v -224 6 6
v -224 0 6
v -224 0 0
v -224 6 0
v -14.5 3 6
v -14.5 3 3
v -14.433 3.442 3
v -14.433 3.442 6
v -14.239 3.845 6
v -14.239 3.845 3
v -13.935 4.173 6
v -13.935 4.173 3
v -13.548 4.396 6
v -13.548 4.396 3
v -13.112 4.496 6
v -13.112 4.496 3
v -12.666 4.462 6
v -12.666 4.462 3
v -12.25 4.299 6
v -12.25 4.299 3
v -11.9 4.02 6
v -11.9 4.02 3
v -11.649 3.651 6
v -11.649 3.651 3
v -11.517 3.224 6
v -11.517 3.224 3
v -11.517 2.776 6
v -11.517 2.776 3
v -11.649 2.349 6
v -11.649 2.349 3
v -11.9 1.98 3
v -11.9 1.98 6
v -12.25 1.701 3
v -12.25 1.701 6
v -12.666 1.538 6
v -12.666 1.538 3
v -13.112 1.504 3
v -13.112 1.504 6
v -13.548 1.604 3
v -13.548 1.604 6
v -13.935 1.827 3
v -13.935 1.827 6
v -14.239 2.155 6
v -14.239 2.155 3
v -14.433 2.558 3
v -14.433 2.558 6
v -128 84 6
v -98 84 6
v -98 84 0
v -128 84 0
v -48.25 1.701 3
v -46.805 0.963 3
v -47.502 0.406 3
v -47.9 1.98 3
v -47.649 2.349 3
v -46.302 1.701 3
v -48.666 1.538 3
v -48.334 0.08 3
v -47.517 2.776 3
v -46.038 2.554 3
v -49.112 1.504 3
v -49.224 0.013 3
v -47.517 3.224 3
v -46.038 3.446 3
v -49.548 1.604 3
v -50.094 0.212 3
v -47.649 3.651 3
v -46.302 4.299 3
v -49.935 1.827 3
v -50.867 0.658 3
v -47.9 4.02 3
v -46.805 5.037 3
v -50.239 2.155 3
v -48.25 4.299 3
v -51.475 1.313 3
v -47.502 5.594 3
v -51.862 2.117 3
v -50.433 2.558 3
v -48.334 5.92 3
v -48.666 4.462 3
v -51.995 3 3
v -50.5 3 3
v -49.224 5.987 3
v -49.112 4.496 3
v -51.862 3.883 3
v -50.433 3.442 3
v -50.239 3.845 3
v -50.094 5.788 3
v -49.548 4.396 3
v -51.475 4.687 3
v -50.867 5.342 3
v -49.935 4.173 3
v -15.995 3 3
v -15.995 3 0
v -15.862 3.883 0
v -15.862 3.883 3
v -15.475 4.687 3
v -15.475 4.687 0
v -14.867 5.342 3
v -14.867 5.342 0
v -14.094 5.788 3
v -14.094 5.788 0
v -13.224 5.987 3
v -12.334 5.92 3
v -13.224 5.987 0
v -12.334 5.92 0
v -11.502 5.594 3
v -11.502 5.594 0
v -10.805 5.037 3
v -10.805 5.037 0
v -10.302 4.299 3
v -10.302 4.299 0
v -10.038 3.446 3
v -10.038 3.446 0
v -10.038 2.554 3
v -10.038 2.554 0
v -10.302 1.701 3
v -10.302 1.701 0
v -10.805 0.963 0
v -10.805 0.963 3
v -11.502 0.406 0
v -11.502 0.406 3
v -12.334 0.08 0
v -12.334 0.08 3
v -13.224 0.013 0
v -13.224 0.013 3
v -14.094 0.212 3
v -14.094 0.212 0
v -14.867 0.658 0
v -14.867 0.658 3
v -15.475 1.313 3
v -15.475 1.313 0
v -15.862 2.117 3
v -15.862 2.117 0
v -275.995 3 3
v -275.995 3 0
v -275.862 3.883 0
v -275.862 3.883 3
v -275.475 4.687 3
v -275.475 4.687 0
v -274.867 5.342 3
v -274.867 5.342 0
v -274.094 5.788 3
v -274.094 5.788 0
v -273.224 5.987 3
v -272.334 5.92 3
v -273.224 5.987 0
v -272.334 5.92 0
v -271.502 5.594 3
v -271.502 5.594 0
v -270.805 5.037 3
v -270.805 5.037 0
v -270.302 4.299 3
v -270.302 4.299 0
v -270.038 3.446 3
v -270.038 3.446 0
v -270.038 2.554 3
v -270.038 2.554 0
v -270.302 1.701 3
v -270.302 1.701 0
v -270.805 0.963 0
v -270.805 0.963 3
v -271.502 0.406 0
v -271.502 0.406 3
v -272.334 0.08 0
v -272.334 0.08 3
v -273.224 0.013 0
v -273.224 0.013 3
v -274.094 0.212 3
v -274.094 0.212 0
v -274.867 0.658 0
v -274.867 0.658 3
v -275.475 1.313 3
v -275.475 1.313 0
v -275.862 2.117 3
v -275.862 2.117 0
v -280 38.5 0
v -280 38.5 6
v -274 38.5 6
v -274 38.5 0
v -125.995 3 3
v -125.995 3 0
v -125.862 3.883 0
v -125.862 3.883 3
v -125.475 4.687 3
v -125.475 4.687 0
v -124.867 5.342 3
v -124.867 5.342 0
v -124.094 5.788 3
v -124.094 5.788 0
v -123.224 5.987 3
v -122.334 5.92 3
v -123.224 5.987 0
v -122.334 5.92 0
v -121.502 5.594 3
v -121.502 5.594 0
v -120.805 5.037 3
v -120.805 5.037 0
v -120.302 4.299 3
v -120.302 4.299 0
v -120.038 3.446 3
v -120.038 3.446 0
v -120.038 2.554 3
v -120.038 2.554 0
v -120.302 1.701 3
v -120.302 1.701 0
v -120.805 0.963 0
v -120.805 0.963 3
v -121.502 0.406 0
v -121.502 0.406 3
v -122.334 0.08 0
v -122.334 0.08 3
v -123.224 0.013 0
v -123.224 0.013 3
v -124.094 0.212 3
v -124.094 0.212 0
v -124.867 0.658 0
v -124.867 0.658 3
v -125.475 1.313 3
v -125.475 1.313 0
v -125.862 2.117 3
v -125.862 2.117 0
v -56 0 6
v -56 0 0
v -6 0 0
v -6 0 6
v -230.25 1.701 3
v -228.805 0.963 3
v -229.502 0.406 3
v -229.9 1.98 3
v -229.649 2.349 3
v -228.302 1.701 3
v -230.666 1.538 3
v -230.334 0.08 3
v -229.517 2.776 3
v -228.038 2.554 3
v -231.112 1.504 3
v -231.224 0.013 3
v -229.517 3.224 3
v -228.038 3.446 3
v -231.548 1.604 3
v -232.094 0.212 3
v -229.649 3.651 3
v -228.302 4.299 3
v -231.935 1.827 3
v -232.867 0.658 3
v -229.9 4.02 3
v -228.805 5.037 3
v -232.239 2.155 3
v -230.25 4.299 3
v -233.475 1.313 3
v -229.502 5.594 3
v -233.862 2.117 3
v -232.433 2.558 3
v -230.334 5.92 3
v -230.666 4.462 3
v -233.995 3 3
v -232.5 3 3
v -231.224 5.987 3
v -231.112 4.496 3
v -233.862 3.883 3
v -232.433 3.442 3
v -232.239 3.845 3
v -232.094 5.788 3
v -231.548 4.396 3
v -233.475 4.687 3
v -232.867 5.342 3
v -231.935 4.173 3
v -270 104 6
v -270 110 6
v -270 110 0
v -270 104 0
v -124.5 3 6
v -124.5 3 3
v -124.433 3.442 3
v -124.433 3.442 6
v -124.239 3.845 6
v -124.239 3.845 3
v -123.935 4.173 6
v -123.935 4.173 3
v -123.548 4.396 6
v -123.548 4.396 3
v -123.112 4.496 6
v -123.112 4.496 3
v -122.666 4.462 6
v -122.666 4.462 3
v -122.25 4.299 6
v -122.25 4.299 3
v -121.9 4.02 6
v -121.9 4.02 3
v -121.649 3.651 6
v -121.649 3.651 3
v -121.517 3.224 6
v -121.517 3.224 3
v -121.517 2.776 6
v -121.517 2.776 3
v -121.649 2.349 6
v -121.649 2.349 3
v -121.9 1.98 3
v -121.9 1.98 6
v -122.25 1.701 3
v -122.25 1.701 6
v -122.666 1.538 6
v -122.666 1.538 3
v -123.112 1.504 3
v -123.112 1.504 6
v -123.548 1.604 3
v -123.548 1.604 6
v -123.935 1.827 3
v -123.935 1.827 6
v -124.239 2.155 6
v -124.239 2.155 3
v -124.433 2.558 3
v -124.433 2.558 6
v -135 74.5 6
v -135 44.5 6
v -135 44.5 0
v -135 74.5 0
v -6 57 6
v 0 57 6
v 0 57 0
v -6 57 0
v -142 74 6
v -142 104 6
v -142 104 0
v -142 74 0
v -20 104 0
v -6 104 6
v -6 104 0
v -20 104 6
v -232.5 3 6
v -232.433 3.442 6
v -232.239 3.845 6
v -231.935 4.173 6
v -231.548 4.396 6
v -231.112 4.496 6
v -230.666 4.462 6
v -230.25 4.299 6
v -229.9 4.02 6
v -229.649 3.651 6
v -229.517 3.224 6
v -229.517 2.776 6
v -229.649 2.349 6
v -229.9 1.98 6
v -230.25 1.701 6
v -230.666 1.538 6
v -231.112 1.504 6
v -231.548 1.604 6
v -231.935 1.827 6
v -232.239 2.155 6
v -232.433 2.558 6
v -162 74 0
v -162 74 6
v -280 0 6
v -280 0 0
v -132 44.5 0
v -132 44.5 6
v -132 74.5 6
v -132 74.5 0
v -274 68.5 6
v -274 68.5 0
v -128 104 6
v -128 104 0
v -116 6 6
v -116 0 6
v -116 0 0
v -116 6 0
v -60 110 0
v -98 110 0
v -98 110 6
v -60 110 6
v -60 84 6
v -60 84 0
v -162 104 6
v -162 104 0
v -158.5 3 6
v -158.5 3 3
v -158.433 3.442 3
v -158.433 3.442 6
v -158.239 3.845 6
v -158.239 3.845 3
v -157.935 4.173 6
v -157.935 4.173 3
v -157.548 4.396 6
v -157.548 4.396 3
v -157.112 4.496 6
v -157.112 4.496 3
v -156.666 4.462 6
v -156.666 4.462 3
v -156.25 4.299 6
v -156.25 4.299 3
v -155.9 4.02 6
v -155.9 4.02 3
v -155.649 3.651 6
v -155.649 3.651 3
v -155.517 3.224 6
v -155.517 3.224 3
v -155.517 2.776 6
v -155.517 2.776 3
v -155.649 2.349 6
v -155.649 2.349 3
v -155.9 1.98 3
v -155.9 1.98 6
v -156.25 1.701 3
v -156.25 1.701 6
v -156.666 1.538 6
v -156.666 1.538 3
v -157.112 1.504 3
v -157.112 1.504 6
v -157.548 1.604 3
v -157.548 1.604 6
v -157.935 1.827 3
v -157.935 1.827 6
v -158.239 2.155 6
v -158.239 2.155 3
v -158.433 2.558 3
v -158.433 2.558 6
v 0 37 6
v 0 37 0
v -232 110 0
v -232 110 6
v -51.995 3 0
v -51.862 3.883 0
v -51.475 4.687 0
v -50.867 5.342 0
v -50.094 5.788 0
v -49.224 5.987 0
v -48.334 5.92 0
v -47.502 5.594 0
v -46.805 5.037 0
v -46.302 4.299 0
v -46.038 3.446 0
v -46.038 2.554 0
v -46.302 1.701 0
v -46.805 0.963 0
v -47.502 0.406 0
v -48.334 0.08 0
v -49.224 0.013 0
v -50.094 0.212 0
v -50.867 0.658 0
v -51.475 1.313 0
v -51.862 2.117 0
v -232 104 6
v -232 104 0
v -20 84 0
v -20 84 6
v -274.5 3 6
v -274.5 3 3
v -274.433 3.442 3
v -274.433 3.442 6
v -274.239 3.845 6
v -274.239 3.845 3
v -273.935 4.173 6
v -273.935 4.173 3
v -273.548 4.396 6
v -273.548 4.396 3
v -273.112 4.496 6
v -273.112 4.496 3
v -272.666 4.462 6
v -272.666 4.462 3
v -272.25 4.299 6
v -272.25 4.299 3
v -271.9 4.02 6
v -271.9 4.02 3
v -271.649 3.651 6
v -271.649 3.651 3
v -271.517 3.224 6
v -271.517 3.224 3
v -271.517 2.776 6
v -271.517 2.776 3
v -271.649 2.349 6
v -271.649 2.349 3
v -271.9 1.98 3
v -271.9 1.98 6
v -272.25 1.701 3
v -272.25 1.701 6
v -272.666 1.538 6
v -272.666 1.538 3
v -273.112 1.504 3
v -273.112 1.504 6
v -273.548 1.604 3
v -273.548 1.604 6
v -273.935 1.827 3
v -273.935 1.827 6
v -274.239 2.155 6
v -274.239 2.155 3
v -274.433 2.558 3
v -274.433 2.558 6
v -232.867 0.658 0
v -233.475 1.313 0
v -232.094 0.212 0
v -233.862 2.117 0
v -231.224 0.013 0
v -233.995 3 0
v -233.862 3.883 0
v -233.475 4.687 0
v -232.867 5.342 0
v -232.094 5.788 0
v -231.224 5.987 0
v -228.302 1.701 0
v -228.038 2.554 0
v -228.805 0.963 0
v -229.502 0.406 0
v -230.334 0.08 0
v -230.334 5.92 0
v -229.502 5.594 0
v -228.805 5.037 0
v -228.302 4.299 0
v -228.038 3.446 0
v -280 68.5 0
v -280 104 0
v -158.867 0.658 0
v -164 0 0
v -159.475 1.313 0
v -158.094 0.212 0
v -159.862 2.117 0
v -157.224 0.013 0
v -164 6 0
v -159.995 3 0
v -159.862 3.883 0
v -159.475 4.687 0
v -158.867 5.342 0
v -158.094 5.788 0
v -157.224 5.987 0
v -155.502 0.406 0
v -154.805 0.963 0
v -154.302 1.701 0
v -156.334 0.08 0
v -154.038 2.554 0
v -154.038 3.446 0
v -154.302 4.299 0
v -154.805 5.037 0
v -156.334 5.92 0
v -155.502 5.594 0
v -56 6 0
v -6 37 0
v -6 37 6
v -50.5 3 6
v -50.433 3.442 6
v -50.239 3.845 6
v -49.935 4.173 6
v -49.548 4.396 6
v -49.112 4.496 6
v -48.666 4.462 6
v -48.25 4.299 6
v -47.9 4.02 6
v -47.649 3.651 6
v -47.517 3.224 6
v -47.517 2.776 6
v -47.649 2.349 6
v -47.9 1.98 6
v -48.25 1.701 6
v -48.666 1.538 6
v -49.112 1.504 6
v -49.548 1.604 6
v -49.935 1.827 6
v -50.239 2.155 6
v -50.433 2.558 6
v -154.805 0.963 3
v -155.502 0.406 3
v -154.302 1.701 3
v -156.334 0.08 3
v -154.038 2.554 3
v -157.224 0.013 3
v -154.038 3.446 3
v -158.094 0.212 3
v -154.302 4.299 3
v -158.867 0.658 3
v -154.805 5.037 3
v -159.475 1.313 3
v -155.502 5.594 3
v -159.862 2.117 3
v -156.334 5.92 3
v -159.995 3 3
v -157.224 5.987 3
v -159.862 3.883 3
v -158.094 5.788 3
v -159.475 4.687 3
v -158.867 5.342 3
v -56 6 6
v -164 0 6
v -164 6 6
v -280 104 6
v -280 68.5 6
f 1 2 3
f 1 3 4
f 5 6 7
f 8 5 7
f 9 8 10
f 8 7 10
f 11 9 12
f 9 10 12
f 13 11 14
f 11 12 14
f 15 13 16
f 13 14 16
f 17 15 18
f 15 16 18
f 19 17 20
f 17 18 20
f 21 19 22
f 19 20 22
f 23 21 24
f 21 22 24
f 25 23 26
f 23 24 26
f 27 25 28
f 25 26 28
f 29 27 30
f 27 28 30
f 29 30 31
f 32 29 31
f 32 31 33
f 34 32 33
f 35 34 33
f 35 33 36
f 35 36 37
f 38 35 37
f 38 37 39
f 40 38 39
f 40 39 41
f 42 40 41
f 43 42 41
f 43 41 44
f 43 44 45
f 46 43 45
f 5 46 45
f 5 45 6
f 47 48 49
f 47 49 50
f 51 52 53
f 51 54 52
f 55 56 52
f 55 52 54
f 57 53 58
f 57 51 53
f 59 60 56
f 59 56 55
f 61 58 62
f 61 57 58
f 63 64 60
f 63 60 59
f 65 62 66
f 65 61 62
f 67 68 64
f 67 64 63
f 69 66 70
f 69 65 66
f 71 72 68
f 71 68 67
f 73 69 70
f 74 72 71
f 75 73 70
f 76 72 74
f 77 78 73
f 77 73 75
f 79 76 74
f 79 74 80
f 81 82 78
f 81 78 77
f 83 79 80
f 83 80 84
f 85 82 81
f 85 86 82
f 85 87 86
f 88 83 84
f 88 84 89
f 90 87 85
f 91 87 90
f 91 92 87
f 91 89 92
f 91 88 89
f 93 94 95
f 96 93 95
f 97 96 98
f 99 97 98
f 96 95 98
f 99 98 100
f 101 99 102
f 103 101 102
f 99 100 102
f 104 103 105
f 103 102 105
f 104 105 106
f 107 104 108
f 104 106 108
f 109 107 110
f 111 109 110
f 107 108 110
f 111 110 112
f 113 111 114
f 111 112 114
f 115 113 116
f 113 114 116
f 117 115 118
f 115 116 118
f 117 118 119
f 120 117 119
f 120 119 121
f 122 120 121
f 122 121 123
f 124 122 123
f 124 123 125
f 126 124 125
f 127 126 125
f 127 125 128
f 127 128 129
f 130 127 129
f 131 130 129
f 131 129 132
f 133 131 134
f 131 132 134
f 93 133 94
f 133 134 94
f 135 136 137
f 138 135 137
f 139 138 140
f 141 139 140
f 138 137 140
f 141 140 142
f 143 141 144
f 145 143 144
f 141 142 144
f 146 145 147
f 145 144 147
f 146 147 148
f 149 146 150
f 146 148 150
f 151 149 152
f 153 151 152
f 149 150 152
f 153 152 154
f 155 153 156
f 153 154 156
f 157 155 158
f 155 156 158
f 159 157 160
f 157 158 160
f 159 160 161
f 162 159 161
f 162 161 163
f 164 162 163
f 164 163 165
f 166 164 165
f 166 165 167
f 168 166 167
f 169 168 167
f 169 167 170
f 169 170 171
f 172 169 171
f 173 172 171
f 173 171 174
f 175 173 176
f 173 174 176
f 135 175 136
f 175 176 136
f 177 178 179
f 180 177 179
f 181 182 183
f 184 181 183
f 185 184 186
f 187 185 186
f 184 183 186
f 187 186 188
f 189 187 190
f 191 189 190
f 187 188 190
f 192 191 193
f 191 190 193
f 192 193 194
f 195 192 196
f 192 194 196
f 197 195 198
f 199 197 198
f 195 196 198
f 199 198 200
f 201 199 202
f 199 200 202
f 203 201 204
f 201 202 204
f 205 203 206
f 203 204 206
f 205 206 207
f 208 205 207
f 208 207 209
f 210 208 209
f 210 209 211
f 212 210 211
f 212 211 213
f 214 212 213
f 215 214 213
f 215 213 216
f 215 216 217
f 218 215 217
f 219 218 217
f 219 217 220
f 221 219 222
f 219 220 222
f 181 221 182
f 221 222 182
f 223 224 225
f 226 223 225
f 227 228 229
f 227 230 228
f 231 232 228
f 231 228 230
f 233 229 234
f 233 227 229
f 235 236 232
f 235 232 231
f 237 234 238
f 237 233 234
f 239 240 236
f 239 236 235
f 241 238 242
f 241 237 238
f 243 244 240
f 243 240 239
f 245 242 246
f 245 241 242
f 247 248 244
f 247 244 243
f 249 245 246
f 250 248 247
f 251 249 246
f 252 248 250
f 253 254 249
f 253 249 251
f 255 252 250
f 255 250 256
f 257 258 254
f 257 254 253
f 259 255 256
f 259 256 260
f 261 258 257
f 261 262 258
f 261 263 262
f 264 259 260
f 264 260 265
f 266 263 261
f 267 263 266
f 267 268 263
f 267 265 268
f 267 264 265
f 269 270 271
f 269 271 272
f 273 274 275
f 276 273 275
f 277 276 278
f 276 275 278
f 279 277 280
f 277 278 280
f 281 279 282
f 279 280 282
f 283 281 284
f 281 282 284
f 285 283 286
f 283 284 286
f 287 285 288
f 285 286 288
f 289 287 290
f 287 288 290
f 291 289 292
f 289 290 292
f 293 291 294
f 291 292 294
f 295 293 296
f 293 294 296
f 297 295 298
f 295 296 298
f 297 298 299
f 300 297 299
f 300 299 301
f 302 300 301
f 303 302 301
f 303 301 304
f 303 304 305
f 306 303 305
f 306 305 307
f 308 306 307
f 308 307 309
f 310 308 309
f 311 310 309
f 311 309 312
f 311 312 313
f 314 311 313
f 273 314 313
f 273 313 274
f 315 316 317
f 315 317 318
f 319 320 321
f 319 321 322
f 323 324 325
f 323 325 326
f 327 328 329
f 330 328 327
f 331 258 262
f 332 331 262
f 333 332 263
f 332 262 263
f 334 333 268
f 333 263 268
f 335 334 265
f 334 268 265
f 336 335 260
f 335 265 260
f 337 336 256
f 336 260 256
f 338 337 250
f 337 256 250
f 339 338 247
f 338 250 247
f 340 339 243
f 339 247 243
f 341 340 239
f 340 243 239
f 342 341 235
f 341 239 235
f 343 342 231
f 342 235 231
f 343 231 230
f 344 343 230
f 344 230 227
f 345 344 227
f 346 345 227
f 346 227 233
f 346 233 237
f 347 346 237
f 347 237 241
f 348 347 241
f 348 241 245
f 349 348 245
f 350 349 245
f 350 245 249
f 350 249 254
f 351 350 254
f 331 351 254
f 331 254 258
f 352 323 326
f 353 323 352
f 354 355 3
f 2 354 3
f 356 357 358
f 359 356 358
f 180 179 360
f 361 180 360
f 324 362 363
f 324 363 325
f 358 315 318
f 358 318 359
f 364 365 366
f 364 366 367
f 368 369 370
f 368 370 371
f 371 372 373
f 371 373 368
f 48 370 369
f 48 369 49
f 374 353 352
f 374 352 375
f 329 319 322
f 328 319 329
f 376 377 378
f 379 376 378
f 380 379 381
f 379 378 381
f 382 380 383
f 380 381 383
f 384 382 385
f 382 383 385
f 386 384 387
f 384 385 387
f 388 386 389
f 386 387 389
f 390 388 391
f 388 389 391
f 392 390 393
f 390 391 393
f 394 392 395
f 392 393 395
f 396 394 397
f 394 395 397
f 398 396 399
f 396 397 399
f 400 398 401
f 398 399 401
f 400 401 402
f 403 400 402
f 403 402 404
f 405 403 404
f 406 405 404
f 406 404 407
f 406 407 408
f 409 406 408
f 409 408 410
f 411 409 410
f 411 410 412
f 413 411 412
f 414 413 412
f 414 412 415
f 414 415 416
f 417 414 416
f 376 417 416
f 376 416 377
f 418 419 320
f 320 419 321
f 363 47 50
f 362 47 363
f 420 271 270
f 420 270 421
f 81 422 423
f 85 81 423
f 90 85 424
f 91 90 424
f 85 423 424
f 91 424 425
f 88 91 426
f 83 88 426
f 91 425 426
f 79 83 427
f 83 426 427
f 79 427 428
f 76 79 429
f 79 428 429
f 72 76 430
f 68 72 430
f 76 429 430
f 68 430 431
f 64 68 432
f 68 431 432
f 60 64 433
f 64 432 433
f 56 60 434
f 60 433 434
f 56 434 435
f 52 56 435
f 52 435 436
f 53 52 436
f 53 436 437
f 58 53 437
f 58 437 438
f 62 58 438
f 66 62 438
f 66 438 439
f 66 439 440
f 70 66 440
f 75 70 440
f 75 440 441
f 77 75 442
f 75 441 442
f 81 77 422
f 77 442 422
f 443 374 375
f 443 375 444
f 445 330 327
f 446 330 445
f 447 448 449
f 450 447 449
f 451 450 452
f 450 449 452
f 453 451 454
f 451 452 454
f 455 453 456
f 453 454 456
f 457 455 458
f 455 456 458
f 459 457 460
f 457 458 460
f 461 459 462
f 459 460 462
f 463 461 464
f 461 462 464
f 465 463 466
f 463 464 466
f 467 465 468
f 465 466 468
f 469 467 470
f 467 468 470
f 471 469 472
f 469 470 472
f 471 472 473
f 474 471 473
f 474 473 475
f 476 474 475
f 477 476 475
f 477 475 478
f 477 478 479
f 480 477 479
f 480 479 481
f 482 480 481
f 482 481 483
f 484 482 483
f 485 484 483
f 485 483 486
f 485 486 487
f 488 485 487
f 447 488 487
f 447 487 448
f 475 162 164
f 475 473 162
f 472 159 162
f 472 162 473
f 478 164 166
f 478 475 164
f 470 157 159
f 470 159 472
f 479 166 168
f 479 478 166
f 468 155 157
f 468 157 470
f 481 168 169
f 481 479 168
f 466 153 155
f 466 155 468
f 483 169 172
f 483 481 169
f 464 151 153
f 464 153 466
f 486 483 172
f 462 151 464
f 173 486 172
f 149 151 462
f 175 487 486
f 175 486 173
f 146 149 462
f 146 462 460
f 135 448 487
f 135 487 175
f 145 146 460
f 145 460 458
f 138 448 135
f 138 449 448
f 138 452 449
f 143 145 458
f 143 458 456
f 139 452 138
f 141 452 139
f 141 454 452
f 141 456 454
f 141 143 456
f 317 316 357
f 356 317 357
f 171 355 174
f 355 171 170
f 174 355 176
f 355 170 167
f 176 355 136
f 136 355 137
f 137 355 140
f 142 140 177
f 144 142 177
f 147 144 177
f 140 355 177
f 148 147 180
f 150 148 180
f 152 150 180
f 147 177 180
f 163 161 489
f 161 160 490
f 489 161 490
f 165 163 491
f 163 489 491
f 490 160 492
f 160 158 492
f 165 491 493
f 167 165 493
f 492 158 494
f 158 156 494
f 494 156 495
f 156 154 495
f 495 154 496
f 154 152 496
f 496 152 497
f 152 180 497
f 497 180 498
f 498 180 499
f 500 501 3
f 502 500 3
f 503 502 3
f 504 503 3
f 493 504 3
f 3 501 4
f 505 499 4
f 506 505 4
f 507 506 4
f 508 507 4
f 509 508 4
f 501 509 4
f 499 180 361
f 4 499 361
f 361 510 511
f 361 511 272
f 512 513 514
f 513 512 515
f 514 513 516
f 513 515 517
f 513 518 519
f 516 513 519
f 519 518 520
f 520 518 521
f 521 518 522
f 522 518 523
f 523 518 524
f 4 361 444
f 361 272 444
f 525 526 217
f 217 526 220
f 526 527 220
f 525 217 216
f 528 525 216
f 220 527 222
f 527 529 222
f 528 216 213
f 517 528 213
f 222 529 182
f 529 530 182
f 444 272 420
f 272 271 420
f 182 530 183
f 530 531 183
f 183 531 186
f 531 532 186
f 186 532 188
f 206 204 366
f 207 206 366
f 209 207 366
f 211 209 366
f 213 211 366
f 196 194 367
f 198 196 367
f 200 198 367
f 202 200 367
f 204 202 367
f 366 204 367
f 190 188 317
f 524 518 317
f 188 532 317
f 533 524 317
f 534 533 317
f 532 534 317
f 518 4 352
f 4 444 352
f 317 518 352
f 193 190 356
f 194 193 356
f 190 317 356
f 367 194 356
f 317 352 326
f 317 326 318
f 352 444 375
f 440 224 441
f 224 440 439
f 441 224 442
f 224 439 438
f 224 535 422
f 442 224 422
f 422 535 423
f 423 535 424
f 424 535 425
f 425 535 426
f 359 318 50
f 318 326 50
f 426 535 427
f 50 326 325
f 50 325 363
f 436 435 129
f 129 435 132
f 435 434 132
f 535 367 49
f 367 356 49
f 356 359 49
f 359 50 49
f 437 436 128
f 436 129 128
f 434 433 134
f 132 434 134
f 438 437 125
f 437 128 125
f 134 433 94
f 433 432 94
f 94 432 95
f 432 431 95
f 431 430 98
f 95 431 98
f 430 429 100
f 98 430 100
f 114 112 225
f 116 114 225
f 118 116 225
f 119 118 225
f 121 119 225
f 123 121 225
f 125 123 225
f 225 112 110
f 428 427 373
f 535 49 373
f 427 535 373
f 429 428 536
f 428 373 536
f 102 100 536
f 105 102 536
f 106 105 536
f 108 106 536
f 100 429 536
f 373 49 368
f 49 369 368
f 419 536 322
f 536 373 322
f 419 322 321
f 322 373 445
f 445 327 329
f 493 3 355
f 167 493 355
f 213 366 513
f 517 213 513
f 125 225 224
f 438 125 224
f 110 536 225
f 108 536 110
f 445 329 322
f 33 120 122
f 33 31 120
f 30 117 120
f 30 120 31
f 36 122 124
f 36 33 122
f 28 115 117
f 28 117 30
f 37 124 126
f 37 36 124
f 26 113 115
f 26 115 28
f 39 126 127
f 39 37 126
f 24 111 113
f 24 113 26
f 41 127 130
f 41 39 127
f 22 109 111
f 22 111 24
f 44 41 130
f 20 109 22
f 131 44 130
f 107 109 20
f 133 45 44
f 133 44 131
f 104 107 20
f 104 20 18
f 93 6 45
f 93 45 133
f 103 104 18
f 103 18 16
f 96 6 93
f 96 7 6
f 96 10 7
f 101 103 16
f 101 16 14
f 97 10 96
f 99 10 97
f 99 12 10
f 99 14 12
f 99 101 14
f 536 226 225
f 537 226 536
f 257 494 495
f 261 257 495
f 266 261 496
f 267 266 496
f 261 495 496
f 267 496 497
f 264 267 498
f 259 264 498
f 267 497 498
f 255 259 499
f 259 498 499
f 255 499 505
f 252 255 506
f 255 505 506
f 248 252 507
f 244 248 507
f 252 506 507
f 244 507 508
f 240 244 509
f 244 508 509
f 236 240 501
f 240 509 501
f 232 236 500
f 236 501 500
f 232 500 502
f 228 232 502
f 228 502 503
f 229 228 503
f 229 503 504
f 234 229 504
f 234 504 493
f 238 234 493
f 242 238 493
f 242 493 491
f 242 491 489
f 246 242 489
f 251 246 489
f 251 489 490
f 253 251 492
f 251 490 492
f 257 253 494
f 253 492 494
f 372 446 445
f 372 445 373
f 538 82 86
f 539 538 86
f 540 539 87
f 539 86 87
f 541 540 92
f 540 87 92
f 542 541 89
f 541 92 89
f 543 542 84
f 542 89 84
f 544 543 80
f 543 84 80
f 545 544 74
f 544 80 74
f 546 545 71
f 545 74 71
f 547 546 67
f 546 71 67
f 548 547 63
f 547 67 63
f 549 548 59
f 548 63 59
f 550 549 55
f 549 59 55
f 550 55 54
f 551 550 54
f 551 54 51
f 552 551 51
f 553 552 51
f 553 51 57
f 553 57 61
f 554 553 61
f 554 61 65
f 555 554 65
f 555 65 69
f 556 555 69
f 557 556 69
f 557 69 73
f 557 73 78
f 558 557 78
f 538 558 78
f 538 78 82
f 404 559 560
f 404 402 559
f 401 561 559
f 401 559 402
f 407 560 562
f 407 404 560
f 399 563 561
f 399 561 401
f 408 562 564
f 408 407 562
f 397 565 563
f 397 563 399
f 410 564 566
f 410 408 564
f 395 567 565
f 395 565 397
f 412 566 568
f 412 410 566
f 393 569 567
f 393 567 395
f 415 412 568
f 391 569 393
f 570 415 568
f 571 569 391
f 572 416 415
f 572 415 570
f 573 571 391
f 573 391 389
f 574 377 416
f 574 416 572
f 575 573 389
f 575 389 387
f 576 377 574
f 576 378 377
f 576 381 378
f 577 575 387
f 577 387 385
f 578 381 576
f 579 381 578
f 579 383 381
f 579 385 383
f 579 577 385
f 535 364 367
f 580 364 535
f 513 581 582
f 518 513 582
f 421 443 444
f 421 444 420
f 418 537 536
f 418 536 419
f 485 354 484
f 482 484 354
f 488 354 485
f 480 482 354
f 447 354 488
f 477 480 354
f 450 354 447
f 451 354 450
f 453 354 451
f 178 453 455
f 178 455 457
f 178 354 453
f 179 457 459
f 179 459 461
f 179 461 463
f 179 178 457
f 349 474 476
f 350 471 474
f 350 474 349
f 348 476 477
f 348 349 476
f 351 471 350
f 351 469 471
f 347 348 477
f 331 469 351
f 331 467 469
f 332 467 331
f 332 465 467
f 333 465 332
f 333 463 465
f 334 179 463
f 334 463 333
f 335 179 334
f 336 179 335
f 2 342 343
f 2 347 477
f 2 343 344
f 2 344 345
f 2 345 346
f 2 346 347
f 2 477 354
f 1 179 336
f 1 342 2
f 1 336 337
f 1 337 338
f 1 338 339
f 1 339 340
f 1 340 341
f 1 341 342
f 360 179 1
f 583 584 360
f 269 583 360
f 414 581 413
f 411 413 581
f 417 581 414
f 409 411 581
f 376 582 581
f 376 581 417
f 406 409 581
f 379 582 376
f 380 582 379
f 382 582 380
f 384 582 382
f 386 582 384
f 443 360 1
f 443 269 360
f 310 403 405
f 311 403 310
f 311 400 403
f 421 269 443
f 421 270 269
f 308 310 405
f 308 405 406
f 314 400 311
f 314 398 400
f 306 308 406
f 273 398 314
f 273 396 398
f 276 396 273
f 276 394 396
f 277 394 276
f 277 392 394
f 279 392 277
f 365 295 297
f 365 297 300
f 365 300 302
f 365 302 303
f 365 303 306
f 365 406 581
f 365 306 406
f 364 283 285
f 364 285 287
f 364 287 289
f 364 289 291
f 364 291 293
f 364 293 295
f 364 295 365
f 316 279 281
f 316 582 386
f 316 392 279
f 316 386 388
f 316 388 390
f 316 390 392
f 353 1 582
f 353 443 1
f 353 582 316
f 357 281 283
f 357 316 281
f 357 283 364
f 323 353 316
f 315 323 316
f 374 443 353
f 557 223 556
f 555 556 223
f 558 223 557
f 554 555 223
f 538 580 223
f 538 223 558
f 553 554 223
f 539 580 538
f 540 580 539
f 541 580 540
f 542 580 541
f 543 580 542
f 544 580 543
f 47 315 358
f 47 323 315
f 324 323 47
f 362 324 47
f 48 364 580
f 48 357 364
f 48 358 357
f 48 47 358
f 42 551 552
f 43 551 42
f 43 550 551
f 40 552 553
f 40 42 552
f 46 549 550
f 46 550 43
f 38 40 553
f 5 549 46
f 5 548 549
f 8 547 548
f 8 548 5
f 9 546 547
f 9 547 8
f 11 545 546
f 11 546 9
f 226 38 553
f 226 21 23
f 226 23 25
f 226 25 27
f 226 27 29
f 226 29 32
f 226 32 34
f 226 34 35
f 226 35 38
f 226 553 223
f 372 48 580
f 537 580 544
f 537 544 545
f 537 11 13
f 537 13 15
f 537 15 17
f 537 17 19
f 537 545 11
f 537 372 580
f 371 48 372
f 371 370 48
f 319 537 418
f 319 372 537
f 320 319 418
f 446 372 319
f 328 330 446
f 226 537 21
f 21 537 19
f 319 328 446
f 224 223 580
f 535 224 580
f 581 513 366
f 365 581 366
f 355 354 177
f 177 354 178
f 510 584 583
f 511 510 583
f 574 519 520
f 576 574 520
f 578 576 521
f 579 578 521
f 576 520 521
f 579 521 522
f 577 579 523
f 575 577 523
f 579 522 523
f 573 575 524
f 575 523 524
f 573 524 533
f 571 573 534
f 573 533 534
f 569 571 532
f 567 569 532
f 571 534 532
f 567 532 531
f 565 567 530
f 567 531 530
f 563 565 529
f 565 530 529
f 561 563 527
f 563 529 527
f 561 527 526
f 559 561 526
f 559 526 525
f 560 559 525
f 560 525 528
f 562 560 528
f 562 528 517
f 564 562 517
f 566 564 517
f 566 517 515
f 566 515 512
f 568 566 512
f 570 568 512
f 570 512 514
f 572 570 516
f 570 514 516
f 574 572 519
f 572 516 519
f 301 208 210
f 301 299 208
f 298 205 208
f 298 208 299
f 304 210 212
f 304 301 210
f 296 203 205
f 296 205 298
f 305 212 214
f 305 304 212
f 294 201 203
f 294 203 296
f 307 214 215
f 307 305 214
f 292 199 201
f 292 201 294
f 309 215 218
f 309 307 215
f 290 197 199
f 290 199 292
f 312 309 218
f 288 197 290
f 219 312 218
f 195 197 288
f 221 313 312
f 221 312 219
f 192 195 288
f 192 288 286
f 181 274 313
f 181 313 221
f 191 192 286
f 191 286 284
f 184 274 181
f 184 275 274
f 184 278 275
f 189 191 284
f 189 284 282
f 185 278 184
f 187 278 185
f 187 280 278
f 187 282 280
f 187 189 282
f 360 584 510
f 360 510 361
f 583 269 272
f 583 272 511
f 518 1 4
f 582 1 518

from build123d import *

# Parameters (mm, degrees)
ESQUISSE2_W             = 330
ESQUISSE2_H             = 110
BOSS_EXTRU_1_DEPTH      = 6
ESQUISSE3_W             = 6
ESQUISSE3_H             = 37
ESQUISSE3_W_2           = 60
ESQUISSE3_H_2           = 6
ESQUISSE3_H_3           = 30
ESQUISSE3_H_4           = 39
ESQUISSE3_W_3           = 3
ENL_V_MAT_EXTRU_1_DEPTH = 348.902285132
ESQUISSE4_W             = 56.799161249
ESQUISSE4_H             = 104
ENL_V_MAT_EXTRU_2_DEPTH = 348.902285132
ESQUISSE5_R             = 1.5
ENL_V_MAT_EXTRU_3_DEPTH = 301.892007205
ESQUISSE6_R             = 2.995
ENL_V_MAT_EXTRU_5_DEPTH = 3


with BuildPart() as part:
    # Esquisse2 → Boss.-Extru.1 (new body)
    with BuildSketch(Plane.XY):
        with Locations((-165, 55)):
            Rectangle(ESQUISSE2_W, ESQUISSE2_H)
    extrude(amount=BOSS_EXTRU_1_DEPTH)

    # Esquisse3 → Enlèv. mat.-Extru.1 (cut, through all)
    with BuildSketch(Plane.XY.offset(6)):
        Polygon((-60, 110), (0, 110), (0, 57), (-6, 57), (-6, 104), (-20, 104), (-20, 84), (-60, 84), align=None)
        with Locations((-3, 18.5)):
            Rectangle(ESQUISSE3_W, ESQUISSE3_H)
        Polygon((-330, 110), (-270, 110), (-270, 104), (-324, 104), (-324, 59), (-330, 59), align=None)
        with Locations((-86, 3)):
            Rectangle(ESQUISSE3_W_2, ESQUISSE3_H_2)
        with Locations((-194, 3)):
            Rectangle(ESQUISSE3_W_2, ESQUISSE3_H_2)
        with Locations((-277, 53.5)):
            Rectangle(ESQUISSE3_W, ESQUISSE3_H_3)
        with Locations((-327, 19.5)):
            Rectangle(ESQUISSE3_W, ESQUISSE3_H_4)
        Polygon((-98, 110), (-98, 84), (-128, 84), (-128, 104), (-142, 104), (-142, 74), (-162, 74), (-162, 104), (-232, 104), (-232, 110), align=None)
        with Locations((-133.5, 59.5)):
            Rectangle(ESQUISSE3_W_3, ESQUISSE3_H_3)
    extrude(amount=-ENL_V_MAT_EXTRU_1_DEPTH, mode=Mode.SUBTRACT)

    # Esquisse4 → Enlèv. mat.-Extru.2 (cut, through all)
    with BuildSketch(Plane.XY.offset(6)):
        with Locations((-308.399580625, 52)):
            Rectangle(ESQUISSE4_W, ESQUISSE4_H)
    extrude(amount=-ENL_V_MAT_EXTRU_2_DEPTH, mode=Mode.SUBTRACT)

    # Esquisse5 → Enlèv. mat.-Extru.3 (cut, through all)
    with BuildSketch(Plane(origin=(0, 0, 0), x_dir=(-1, 0, 0), z_dir=(0, 0, -1))):
        with Locations((13, 3)):
            Circle(ESQUISSE5_R)
        with Locations((49, 3)):
            Circle(ESQUISSE5_R)
        with Locations((123, 3)):
            Circle(ESQUISSE5_R)
        with Locations((157, 3)):
            Circle(ESQUISSE5_R)
        with Locations((231, 3)):
            Circle(ESQUISSE5_R)
        with Locations((273, 3)):
            Circle(ESQUISSE5_R)
    extrude(amount=-ENL_V_MAT_EXTRU_3_DEPTH, mode=Mode.SUBTRACT)

    # Esquisse6 → Enlèv. mat.-Extru.5 (cut)
    with BuildSketch(Plane(origin=(0, 0, 0), x_dir=(-1, 0, 0), z_dir=(0, 0, -1))):
        with Locations((13, 3)):
            Circle(ESQUISSE6_R)
        with Locations((49, 3)):
            Circle(ESQUISSE6_R)
        with Locations((123, 3)):
            Circle(ESQUISSE6_R)
        with Locations((157, 3)):
            Circle(ESQUISSE6_R)
        with Locations((273, 3)):
            Circle(ESQUISSE6_R)
        with Locations((231, 3)):
            Circle(ESQUISSE6_R)
    extrude(amount=-ENL_V_MAT_EXTRU_5_DEPTH, mode=Mode.SUBTRACT)


solid = part.part
